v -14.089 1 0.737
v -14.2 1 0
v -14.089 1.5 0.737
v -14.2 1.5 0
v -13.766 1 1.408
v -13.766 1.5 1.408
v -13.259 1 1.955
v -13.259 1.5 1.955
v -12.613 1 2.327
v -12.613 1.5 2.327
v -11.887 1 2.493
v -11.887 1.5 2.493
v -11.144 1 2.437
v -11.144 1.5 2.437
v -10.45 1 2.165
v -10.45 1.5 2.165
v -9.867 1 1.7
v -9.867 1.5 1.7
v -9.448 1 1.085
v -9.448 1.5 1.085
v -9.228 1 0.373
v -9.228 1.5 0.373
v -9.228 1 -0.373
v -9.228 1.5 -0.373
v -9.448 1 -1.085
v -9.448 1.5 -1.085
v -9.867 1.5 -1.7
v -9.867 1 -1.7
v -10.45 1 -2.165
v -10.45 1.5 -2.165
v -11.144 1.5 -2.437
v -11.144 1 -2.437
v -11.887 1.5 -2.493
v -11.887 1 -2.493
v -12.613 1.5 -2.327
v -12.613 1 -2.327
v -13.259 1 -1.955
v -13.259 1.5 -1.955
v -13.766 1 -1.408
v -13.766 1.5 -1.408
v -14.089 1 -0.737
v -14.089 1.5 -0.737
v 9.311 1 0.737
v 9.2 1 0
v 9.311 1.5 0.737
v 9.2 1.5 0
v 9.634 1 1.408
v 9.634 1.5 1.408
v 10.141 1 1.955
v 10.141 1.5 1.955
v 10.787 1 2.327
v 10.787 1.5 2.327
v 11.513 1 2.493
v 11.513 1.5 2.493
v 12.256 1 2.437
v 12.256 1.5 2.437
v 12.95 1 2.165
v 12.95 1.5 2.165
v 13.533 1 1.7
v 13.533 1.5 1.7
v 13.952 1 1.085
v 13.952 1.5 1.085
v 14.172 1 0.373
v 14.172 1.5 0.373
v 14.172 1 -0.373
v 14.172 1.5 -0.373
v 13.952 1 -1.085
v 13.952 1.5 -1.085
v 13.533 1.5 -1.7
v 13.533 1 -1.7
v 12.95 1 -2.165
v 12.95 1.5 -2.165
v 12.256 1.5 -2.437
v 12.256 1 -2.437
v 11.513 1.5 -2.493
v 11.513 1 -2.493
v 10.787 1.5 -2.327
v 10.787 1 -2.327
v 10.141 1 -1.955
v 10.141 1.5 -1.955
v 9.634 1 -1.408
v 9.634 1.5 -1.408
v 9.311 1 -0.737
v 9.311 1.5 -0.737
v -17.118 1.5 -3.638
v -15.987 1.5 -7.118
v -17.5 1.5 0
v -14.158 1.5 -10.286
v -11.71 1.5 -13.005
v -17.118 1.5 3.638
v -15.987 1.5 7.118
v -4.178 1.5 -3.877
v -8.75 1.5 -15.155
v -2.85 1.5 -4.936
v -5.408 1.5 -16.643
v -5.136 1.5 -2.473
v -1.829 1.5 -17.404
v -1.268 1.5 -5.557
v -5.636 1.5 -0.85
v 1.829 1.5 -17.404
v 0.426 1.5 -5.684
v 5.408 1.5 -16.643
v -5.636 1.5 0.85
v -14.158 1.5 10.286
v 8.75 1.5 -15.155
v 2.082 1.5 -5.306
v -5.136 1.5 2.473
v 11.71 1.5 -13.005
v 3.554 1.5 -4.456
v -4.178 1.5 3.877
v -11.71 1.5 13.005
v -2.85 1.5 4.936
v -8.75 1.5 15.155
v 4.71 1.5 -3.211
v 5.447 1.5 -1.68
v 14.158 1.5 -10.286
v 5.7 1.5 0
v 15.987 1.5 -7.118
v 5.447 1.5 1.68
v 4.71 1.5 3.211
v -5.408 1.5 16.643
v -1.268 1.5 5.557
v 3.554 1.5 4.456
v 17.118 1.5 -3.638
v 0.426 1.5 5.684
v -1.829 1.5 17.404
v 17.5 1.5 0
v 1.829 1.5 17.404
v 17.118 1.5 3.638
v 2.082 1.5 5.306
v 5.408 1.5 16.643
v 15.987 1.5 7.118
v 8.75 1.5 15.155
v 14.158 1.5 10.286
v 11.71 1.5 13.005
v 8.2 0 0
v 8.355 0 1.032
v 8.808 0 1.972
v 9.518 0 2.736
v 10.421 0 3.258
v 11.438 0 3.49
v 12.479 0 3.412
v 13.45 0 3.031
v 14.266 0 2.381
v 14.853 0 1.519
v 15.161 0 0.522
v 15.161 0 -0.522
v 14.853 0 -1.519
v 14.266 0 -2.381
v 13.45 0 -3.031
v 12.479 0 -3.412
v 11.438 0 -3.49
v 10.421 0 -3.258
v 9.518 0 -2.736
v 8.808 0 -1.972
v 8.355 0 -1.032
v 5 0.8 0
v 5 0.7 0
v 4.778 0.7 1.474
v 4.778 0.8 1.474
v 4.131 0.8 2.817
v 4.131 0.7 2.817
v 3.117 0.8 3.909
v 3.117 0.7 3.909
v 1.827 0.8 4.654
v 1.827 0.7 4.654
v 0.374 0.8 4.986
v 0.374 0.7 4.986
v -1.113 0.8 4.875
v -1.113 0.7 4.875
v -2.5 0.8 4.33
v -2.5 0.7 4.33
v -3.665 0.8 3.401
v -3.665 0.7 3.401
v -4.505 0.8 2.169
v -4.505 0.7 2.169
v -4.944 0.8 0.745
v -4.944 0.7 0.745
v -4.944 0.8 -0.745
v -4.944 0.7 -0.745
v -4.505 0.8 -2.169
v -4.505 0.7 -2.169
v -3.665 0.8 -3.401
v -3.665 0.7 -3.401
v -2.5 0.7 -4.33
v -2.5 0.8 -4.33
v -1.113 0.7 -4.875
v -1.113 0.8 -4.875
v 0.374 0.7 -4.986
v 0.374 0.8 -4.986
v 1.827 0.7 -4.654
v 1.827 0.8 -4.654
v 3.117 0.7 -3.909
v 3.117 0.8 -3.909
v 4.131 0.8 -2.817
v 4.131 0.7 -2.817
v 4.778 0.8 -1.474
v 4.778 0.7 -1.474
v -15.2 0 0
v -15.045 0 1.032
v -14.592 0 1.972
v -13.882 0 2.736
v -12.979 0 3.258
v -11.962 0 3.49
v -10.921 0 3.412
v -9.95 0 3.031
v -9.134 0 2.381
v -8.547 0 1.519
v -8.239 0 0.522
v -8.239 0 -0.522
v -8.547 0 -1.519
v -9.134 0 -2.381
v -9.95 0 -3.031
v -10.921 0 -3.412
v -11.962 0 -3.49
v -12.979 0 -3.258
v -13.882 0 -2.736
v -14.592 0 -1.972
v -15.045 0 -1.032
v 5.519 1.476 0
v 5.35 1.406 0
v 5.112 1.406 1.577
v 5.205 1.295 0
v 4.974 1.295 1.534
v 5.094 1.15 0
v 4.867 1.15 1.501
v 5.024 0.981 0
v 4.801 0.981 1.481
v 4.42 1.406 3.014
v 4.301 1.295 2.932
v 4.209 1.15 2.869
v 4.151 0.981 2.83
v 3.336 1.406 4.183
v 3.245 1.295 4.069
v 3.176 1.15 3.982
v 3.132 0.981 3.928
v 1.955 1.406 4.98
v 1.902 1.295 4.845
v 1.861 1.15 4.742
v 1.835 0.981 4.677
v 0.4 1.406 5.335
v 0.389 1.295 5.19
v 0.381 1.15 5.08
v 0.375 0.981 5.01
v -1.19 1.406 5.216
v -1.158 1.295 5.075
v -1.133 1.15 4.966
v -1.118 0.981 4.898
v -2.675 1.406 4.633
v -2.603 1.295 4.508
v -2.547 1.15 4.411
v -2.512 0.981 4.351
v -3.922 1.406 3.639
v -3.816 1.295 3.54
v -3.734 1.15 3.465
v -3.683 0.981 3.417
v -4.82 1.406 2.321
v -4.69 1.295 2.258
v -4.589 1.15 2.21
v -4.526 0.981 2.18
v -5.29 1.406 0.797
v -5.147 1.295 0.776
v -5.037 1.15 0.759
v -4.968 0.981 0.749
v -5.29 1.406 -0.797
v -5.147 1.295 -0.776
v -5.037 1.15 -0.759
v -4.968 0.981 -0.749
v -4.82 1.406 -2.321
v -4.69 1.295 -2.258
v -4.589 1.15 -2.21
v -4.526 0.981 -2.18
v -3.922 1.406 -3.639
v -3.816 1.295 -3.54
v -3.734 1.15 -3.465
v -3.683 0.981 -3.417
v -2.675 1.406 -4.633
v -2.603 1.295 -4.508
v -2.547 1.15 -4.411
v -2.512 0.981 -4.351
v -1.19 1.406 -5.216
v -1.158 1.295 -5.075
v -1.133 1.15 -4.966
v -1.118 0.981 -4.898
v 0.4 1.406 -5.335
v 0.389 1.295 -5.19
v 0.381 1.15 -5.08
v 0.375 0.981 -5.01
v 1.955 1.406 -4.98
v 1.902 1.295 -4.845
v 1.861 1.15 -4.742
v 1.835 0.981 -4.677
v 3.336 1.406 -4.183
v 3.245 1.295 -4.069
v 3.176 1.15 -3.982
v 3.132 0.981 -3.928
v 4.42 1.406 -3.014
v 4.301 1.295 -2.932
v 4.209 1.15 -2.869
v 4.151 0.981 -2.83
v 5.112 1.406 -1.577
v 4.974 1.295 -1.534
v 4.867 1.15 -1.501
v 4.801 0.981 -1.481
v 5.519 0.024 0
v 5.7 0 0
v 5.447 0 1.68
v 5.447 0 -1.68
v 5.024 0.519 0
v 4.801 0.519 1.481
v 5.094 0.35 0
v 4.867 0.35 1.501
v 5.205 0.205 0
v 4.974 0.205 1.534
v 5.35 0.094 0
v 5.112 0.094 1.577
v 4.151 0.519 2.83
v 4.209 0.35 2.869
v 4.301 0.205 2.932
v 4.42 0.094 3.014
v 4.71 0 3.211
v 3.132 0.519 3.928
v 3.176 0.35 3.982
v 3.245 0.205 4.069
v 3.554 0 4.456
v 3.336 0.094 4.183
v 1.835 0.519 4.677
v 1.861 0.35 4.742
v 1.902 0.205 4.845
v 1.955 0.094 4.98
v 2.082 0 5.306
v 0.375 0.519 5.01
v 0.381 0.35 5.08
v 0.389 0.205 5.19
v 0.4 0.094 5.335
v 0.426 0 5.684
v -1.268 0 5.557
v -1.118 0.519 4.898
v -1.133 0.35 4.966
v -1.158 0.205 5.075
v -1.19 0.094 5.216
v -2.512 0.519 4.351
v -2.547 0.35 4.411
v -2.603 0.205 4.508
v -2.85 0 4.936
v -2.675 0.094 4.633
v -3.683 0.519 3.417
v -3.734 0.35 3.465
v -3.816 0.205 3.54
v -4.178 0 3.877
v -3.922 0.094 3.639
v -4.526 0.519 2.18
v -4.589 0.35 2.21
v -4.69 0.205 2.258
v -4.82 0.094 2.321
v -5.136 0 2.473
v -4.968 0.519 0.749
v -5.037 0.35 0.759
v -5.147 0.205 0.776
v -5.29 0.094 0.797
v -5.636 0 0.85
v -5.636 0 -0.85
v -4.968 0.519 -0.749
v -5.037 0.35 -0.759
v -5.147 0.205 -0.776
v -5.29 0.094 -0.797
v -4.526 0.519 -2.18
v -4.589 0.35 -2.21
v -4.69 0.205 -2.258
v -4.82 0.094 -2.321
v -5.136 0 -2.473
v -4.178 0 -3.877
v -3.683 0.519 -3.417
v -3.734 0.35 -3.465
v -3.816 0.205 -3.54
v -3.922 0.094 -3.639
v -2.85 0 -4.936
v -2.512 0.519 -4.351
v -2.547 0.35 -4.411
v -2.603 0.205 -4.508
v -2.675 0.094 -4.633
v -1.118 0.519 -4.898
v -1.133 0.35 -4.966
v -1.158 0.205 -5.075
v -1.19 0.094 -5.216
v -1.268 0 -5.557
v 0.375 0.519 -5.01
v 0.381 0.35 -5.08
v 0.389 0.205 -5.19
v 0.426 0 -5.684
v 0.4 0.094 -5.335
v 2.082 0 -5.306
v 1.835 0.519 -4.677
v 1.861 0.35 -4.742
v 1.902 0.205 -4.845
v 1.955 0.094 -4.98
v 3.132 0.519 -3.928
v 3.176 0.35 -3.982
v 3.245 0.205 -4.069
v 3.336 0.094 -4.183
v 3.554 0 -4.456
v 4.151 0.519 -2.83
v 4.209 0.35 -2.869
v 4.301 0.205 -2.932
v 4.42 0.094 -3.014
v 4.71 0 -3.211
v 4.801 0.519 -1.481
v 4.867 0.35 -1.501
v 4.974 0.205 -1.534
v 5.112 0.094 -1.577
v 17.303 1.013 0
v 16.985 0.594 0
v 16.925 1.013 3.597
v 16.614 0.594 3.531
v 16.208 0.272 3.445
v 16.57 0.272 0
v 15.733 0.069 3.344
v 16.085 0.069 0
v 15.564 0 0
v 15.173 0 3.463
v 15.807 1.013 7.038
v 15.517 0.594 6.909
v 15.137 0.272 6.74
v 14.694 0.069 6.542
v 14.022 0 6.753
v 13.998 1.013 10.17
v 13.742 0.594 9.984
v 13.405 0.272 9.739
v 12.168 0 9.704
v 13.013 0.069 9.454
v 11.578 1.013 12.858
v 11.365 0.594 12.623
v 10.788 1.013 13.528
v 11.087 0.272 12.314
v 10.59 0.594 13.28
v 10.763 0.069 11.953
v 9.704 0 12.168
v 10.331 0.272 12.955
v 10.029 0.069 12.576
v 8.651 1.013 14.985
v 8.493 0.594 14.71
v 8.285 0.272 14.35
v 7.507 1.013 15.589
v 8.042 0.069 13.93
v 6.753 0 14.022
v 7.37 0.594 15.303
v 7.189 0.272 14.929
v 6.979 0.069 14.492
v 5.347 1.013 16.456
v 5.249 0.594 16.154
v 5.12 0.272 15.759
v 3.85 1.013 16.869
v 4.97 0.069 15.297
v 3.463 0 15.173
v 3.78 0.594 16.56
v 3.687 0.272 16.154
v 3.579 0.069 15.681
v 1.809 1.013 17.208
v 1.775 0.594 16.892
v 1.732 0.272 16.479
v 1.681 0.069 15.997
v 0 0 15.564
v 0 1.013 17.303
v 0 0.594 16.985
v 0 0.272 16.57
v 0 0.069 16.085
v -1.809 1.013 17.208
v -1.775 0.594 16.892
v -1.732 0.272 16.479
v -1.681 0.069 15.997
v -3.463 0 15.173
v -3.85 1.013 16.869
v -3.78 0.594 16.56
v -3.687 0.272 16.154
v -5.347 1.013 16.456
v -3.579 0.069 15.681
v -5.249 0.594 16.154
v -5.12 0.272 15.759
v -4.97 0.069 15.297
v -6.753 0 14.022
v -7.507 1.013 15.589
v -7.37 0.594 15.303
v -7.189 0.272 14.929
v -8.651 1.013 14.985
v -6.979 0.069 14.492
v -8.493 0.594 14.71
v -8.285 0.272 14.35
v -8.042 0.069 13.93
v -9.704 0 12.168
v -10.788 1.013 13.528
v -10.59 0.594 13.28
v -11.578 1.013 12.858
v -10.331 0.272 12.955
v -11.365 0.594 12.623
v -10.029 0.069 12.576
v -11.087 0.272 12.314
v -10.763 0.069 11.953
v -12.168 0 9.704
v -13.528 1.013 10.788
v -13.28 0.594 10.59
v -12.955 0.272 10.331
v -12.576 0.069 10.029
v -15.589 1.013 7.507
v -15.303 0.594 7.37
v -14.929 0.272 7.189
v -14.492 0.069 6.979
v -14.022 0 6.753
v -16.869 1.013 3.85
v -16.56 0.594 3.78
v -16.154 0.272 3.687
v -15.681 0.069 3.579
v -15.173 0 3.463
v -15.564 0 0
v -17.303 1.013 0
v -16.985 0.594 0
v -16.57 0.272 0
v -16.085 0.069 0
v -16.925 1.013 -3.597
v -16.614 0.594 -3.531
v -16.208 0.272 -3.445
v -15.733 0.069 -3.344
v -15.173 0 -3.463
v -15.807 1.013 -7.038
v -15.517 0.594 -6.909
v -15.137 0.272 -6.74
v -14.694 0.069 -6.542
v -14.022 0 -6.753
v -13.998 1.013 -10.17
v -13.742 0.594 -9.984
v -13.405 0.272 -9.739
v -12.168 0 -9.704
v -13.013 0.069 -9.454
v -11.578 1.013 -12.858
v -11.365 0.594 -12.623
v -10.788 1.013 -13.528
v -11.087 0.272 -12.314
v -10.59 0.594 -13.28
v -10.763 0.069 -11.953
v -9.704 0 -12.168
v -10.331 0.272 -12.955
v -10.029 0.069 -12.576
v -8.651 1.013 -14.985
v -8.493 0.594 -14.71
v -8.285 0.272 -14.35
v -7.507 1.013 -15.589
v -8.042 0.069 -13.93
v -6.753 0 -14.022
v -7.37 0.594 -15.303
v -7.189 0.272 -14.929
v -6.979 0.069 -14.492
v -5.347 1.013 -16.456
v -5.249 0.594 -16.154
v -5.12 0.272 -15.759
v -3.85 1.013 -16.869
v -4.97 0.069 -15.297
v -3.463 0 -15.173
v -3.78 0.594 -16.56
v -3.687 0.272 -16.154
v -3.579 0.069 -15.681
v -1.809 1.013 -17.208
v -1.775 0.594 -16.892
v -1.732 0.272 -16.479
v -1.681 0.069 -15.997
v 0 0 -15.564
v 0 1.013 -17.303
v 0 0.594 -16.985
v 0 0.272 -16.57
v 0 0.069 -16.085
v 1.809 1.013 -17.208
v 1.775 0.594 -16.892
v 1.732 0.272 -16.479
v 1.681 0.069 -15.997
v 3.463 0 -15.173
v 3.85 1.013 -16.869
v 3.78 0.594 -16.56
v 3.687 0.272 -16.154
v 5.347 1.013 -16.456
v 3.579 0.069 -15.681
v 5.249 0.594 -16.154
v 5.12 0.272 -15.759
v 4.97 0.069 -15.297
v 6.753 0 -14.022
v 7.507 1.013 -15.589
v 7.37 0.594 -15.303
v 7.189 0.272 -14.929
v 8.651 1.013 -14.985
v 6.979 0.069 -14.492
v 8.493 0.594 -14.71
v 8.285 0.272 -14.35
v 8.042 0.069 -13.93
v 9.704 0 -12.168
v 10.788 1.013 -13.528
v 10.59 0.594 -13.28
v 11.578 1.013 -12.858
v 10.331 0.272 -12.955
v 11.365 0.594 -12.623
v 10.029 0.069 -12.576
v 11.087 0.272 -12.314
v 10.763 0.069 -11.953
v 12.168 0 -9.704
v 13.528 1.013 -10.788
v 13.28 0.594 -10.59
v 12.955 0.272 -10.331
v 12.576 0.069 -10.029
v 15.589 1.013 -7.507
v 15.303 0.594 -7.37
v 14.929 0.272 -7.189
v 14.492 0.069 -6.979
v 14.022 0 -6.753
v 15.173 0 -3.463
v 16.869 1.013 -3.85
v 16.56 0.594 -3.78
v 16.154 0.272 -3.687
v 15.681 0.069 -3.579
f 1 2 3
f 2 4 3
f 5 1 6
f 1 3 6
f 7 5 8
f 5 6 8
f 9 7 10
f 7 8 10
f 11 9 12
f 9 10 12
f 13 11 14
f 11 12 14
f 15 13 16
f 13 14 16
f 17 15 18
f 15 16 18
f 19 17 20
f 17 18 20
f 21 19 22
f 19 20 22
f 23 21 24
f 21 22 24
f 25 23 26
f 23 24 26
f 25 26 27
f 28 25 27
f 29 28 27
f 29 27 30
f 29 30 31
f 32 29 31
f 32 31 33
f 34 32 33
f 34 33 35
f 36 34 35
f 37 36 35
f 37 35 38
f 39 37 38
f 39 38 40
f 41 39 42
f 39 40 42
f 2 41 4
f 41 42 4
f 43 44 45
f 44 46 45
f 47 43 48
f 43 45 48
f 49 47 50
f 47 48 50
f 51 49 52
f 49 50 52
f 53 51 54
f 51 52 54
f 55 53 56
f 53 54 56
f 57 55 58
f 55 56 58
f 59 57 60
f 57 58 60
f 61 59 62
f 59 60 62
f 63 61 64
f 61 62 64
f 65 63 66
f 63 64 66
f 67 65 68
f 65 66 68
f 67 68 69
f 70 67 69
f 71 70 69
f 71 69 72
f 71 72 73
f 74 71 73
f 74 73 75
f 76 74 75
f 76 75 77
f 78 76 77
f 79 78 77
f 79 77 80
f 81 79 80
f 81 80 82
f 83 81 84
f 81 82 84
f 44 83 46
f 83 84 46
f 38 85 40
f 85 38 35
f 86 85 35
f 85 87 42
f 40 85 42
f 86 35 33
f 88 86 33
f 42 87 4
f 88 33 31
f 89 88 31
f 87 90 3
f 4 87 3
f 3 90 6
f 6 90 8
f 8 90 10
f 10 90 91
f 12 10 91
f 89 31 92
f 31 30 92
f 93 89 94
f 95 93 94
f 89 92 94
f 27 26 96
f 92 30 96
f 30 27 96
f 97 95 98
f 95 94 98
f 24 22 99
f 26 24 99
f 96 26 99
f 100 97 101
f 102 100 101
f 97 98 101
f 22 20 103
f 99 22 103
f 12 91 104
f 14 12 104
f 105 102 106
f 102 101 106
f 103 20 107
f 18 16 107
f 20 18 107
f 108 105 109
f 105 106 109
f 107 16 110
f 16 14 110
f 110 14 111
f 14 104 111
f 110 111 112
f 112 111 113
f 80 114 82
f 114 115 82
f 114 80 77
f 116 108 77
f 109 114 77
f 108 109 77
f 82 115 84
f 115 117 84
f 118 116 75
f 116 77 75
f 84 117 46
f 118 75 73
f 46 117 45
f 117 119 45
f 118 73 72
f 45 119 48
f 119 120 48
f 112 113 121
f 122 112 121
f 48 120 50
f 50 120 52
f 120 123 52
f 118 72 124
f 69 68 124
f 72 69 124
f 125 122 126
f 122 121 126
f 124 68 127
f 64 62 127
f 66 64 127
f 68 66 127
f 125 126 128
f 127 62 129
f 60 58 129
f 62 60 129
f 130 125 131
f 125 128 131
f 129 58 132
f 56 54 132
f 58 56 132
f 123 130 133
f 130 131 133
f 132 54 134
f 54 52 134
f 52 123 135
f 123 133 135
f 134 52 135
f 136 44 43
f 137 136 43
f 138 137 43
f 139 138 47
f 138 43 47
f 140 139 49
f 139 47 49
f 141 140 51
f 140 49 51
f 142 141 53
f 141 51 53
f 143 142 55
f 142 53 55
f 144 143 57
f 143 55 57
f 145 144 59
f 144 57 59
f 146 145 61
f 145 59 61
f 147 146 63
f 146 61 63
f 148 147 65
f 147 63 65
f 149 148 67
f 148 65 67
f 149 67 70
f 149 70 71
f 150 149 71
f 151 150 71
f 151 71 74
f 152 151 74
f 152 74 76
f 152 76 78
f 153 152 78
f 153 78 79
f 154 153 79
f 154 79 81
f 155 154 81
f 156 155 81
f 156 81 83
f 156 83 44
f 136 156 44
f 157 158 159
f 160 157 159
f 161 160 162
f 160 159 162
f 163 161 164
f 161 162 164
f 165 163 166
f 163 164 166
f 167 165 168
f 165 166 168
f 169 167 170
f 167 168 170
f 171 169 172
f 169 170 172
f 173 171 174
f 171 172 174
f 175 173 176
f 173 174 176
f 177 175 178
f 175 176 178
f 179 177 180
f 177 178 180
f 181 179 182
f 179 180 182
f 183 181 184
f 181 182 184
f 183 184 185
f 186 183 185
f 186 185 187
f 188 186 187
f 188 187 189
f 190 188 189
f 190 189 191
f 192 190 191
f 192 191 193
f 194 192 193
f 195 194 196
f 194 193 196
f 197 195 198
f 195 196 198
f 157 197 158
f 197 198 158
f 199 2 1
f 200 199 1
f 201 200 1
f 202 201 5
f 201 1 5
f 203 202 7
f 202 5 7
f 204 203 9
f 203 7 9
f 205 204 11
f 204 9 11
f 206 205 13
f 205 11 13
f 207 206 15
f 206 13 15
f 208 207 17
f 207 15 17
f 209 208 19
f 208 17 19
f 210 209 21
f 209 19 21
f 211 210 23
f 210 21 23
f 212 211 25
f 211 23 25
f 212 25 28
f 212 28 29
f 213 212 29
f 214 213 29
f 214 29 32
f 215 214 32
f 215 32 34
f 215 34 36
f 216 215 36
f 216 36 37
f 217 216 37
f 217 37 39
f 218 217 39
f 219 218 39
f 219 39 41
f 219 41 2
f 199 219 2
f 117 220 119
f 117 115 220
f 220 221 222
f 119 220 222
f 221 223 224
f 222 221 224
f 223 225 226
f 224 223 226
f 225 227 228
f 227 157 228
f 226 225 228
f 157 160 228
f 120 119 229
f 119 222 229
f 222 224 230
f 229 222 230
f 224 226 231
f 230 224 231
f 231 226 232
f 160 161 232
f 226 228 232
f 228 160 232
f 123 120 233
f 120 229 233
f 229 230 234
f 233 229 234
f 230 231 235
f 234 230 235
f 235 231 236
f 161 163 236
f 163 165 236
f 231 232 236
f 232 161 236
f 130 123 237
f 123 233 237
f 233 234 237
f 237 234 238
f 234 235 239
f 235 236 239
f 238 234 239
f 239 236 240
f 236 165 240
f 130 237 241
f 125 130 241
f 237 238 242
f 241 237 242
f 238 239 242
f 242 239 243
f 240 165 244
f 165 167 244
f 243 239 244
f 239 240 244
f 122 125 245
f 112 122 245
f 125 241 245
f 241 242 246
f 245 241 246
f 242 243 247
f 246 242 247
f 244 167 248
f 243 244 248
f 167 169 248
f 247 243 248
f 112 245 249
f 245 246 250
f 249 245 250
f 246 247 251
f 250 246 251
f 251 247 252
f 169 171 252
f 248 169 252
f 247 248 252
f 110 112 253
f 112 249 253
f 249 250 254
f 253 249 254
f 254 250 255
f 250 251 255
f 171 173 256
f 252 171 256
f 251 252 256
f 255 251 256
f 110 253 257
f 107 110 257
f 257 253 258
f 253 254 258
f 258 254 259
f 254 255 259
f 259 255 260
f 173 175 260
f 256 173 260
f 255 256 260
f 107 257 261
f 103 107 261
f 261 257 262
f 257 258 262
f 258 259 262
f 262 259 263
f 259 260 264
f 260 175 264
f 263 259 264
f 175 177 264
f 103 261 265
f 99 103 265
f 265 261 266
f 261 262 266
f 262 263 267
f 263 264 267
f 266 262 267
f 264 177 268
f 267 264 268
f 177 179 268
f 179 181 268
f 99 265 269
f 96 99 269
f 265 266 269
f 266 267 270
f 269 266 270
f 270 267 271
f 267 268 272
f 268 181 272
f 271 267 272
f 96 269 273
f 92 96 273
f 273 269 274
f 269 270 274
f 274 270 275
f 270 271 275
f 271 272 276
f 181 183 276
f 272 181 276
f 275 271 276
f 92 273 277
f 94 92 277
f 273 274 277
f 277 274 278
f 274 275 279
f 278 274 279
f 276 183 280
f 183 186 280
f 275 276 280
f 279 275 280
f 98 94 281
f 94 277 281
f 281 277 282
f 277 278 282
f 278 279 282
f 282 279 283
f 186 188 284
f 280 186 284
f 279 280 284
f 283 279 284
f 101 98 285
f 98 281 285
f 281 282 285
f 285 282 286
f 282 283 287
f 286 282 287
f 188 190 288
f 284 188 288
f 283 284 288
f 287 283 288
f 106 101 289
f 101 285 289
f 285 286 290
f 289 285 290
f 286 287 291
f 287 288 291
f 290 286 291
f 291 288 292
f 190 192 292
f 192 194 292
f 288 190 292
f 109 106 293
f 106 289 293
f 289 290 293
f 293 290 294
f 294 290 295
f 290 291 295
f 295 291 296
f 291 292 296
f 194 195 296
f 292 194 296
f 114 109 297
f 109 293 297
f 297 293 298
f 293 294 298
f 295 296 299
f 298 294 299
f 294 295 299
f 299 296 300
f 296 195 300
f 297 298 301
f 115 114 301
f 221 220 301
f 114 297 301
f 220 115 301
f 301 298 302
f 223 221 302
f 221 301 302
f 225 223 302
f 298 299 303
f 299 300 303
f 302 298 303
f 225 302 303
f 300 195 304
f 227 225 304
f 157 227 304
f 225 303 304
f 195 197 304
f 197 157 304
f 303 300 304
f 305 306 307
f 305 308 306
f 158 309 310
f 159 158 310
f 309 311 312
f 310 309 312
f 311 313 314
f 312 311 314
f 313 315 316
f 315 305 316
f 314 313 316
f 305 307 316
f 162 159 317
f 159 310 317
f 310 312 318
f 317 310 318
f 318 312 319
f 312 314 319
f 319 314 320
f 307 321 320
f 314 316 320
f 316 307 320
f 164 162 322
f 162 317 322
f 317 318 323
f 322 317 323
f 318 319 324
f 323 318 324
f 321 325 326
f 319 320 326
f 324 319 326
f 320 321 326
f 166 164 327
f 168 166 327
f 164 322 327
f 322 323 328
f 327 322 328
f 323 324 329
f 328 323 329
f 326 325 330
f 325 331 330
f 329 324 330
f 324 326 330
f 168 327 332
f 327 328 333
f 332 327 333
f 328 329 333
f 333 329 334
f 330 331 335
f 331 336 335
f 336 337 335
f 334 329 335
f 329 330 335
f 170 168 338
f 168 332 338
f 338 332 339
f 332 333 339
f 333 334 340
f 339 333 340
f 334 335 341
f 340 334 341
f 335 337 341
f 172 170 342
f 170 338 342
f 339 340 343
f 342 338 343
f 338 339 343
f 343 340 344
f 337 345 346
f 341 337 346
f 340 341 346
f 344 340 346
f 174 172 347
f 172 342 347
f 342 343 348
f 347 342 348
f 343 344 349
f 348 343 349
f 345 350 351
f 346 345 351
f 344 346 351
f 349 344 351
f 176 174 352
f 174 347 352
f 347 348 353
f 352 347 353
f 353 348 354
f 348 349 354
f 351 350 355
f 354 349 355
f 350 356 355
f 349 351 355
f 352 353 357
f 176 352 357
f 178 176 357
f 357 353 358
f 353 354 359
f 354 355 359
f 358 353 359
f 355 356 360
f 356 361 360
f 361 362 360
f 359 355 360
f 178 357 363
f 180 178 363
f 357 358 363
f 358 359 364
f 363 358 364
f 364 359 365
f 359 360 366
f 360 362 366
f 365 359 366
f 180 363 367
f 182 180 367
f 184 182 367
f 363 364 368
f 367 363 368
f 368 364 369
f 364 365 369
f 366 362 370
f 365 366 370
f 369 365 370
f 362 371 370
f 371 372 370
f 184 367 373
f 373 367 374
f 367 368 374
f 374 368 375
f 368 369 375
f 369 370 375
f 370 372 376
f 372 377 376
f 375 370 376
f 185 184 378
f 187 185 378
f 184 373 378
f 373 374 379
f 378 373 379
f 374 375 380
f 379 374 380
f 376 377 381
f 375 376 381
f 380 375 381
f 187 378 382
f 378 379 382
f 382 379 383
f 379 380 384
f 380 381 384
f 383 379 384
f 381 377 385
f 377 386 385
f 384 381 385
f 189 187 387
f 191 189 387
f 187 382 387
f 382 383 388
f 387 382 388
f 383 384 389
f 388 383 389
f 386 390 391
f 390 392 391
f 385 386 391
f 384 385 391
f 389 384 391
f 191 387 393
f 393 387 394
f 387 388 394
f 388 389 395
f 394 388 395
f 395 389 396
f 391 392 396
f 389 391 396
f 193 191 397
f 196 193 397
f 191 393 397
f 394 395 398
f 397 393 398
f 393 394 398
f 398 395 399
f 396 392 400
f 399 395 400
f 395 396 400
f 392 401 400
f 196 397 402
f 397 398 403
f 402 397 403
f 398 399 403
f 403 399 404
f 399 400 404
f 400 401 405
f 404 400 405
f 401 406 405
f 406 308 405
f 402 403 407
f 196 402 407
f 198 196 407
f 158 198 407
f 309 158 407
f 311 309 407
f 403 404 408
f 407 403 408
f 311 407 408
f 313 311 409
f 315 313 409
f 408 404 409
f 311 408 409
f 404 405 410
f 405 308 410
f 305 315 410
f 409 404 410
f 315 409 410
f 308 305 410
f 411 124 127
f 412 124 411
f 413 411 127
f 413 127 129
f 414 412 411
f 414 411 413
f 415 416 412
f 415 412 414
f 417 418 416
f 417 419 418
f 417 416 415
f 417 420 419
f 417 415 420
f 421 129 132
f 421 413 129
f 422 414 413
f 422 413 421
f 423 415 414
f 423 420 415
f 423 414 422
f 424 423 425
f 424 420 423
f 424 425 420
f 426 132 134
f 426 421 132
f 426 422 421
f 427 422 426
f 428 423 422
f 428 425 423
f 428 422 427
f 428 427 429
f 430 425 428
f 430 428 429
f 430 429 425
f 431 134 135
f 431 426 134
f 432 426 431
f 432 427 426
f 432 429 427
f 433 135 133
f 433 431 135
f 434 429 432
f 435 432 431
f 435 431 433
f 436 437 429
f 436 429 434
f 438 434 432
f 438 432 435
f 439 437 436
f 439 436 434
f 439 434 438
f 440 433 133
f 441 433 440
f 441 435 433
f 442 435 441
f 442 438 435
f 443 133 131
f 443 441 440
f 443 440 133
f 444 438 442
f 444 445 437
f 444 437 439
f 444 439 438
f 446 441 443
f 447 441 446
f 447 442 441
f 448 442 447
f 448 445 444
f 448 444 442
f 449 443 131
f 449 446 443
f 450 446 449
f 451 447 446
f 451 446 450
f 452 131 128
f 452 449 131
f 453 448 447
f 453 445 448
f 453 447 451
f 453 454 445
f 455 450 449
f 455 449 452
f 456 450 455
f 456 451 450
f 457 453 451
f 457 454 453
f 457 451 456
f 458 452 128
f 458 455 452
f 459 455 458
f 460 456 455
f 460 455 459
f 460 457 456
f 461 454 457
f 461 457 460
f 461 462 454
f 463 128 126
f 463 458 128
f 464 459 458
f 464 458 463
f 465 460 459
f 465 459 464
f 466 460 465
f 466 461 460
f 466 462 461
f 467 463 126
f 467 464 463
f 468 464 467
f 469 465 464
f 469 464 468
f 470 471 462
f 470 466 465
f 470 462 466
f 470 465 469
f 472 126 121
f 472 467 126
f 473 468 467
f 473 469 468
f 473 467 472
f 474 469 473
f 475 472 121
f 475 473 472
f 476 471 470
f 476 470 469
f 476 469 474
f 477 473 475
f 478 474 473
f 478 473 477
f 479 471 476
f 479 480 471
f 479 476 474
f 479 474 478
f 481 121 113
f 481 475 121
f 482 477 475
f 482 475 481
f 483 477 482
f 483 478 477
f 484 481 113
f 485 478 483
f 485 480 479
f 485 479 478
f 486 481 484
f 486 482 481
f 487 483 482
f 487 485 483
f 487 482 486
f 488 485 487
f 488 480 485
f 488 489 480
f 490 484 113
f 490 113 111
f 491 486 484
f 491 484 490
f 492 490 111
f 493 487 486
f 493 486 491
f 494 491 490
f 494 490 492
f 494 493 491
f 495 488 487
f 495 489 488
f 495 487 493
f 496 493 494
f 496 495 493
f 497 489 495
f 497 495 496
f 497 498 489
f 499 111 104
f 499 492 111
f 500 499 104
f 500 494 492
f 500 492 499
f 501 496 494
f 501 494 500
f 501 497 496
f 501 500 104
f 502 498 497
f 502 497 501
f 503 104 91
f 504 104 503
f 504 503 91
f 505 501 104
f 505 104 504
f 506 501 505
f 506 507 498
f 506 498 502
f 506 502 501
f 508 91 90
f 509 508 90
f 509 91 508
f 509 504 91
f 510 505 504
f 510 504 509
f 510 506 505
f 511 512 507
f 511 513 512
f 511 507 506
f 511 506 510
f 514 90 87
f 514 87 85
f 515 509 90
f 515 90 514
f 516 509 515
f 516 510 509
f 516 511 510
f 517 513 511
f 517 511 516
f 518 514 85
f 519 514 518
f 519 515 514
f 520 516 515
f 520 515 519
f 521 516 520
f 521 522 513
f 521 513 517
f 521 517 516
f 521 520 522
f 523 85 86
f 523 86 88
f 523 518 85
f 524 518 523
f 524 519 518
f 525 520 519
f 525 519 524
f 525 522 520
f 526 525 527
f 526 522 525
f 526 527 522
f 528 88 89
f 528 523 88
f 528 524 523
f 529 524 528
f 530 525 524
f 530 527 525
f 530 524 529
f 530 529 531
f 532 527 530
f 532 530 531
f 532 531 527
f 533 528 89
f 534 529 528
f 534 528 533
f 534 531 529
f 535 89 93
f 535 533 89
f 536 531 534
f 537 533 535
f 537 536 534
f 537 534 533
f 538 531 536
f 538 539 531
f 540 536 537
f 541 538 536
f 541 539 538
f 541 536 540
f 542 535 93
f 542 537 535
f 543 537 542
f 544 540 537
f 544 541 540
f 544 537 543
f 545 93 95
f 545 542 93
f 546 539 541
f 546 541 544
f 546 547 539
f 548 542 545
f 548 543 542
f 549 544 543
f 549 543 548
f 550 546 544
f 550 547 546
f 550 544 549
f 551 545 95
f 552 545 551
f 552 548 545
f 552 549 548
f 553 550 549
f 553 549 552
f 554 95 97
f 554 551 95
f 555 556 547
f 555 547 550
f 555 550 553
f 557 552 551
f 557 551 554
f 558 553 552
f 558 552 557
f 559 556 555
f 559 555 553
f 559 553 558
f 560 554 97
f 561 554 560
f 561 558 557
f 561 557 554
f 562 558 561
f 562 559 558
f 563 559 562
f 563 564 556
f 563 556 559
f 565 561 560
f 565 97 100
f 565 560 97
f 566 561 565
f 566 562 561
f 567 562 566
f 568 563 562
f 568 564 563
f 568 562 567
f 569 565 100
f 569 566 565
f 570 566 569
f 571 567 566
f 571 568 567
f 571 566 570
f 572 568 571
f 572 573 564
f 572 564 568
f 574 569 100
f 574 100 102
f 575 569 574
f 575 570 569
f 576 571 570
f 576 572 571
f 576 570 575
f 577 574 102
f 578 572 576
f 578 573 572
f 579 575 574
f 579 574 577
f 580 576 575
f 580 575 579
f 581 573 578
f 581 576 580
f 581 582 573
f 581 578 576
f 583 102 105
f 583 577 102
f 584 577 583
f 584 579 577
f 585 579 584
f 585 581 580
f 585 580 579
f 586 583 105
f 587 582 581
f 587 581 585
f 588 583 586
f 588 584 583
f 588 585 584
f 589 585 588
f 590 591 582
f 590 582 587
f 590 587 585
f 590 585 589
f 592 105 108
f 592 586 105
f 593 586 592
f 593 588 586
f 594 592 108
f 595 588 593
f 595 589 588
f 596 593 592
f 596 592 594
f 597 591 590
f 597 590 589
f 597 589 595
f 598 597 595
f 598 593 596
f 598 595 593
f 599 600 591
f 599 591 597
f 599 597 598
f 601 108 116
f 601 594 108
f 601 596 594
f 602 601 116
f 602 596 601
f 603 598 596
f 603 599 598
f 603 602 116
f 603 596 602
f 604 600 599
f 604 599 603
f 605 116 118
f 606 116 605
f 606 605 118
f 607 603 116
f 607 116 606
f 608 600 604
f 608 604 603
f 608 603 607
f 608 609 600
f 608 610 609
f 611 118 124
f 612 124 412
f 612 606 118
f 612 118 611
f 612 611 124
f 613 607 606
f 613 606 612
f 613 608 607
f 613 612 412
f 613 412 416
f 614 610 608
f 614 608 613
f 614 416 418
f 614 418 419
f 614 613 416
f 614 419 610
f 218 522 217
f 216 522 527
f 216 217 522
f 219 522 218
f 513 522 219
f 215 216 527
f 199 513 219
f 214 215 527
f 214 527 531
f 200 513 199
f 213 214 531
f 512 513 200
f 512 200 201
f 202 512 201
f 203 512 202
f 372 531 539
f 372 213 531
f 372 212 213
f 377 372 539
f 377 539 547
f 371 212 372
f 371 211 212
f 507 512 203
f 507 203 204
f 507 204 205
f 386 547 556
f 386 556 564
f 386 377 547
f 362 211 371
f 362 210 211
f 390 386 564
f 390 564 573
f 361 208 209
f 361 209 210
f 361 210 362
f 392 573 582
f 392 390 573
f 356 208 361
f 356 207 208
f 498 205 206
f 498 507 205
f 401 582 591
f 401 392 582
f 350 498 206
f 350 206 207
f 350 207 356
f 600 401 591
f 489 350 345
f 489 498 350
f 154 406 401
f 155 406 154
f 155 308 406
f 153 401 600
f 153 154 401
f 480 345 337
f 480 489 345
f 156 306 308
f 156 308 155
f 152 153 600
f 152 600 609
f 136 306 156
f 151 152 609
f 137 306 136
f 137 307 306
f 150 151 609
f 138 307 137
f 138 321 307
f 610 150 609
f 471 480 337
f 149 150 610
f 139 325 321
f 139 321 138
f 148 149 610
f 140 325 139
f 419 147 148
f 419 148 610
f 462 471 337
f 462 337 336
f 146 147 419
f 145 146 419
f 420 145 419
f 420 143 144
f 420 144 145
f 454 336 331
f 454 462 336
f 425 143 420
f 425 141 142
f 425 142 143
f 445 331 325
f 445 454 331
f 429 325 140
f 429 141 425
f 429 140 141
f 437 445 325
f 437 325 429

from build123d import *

# Parameters (mm, degrees)
F0_R           = 17.5
F0_R_2         = 5
F1_DEPTH       = 1.5
F2_D           = 5
F2_CSINK_D     = 7
F2_CSINK_ANGLE = 90
F4_R           = 0.7


# Not quite as in the source:
# - a fillet or chamfer that OpenCascade refuses, or shapes differently, is made with other operations: its cross-section is extruded or revolved along the edge and cut away or added


with BuildPart() as f1:
    # F0 (on Front) → F1 (new body)
    with BuildSketch(Plane.XZ):
        Circle(F0_R)
        Circle(F0_R_2, mode=Mode.SUBTRACT)
    extrude(amount=-F1_DEPTH)

    # F2 (through all)
    with Locations(Plane.XZ):
        with Locations((-11.7, 0), (11.7, 0)):
            CounterSinkHole(F2_D / 2, F2_CSINK_D / 2, counter_sink_angle=F2_CSINK_ANGLE)

    # F3: fillet of radius 2 on 1 edges, made by hand

    # F3_s1 → F3_t2 (revolve, cut)
    with BuildSketch(Plane.XY):
        with BuildLine():
            ThreePointArc((17.5, 1.5), (16.7882531983, 0.4188611699), (15.5635083269, 0))
            Line((15.5635083269, 0), (17.5, 0))
            Line((17.5, 0), (17.5, 1.5))
        make_face()
    revolve(axis=Axis((0, 0, 0), (0, -1, 0)), mode=Mode.SUBTRACT)

    # F4
    f4_edges = [f1.edges().sort_by_distance(p)[0] for p in [
        (-5, 0, 0),
        (-5, 1.5, 0),
    ]]
    fillet(f4_edges, radius=F4_R)


solid = f1.part
